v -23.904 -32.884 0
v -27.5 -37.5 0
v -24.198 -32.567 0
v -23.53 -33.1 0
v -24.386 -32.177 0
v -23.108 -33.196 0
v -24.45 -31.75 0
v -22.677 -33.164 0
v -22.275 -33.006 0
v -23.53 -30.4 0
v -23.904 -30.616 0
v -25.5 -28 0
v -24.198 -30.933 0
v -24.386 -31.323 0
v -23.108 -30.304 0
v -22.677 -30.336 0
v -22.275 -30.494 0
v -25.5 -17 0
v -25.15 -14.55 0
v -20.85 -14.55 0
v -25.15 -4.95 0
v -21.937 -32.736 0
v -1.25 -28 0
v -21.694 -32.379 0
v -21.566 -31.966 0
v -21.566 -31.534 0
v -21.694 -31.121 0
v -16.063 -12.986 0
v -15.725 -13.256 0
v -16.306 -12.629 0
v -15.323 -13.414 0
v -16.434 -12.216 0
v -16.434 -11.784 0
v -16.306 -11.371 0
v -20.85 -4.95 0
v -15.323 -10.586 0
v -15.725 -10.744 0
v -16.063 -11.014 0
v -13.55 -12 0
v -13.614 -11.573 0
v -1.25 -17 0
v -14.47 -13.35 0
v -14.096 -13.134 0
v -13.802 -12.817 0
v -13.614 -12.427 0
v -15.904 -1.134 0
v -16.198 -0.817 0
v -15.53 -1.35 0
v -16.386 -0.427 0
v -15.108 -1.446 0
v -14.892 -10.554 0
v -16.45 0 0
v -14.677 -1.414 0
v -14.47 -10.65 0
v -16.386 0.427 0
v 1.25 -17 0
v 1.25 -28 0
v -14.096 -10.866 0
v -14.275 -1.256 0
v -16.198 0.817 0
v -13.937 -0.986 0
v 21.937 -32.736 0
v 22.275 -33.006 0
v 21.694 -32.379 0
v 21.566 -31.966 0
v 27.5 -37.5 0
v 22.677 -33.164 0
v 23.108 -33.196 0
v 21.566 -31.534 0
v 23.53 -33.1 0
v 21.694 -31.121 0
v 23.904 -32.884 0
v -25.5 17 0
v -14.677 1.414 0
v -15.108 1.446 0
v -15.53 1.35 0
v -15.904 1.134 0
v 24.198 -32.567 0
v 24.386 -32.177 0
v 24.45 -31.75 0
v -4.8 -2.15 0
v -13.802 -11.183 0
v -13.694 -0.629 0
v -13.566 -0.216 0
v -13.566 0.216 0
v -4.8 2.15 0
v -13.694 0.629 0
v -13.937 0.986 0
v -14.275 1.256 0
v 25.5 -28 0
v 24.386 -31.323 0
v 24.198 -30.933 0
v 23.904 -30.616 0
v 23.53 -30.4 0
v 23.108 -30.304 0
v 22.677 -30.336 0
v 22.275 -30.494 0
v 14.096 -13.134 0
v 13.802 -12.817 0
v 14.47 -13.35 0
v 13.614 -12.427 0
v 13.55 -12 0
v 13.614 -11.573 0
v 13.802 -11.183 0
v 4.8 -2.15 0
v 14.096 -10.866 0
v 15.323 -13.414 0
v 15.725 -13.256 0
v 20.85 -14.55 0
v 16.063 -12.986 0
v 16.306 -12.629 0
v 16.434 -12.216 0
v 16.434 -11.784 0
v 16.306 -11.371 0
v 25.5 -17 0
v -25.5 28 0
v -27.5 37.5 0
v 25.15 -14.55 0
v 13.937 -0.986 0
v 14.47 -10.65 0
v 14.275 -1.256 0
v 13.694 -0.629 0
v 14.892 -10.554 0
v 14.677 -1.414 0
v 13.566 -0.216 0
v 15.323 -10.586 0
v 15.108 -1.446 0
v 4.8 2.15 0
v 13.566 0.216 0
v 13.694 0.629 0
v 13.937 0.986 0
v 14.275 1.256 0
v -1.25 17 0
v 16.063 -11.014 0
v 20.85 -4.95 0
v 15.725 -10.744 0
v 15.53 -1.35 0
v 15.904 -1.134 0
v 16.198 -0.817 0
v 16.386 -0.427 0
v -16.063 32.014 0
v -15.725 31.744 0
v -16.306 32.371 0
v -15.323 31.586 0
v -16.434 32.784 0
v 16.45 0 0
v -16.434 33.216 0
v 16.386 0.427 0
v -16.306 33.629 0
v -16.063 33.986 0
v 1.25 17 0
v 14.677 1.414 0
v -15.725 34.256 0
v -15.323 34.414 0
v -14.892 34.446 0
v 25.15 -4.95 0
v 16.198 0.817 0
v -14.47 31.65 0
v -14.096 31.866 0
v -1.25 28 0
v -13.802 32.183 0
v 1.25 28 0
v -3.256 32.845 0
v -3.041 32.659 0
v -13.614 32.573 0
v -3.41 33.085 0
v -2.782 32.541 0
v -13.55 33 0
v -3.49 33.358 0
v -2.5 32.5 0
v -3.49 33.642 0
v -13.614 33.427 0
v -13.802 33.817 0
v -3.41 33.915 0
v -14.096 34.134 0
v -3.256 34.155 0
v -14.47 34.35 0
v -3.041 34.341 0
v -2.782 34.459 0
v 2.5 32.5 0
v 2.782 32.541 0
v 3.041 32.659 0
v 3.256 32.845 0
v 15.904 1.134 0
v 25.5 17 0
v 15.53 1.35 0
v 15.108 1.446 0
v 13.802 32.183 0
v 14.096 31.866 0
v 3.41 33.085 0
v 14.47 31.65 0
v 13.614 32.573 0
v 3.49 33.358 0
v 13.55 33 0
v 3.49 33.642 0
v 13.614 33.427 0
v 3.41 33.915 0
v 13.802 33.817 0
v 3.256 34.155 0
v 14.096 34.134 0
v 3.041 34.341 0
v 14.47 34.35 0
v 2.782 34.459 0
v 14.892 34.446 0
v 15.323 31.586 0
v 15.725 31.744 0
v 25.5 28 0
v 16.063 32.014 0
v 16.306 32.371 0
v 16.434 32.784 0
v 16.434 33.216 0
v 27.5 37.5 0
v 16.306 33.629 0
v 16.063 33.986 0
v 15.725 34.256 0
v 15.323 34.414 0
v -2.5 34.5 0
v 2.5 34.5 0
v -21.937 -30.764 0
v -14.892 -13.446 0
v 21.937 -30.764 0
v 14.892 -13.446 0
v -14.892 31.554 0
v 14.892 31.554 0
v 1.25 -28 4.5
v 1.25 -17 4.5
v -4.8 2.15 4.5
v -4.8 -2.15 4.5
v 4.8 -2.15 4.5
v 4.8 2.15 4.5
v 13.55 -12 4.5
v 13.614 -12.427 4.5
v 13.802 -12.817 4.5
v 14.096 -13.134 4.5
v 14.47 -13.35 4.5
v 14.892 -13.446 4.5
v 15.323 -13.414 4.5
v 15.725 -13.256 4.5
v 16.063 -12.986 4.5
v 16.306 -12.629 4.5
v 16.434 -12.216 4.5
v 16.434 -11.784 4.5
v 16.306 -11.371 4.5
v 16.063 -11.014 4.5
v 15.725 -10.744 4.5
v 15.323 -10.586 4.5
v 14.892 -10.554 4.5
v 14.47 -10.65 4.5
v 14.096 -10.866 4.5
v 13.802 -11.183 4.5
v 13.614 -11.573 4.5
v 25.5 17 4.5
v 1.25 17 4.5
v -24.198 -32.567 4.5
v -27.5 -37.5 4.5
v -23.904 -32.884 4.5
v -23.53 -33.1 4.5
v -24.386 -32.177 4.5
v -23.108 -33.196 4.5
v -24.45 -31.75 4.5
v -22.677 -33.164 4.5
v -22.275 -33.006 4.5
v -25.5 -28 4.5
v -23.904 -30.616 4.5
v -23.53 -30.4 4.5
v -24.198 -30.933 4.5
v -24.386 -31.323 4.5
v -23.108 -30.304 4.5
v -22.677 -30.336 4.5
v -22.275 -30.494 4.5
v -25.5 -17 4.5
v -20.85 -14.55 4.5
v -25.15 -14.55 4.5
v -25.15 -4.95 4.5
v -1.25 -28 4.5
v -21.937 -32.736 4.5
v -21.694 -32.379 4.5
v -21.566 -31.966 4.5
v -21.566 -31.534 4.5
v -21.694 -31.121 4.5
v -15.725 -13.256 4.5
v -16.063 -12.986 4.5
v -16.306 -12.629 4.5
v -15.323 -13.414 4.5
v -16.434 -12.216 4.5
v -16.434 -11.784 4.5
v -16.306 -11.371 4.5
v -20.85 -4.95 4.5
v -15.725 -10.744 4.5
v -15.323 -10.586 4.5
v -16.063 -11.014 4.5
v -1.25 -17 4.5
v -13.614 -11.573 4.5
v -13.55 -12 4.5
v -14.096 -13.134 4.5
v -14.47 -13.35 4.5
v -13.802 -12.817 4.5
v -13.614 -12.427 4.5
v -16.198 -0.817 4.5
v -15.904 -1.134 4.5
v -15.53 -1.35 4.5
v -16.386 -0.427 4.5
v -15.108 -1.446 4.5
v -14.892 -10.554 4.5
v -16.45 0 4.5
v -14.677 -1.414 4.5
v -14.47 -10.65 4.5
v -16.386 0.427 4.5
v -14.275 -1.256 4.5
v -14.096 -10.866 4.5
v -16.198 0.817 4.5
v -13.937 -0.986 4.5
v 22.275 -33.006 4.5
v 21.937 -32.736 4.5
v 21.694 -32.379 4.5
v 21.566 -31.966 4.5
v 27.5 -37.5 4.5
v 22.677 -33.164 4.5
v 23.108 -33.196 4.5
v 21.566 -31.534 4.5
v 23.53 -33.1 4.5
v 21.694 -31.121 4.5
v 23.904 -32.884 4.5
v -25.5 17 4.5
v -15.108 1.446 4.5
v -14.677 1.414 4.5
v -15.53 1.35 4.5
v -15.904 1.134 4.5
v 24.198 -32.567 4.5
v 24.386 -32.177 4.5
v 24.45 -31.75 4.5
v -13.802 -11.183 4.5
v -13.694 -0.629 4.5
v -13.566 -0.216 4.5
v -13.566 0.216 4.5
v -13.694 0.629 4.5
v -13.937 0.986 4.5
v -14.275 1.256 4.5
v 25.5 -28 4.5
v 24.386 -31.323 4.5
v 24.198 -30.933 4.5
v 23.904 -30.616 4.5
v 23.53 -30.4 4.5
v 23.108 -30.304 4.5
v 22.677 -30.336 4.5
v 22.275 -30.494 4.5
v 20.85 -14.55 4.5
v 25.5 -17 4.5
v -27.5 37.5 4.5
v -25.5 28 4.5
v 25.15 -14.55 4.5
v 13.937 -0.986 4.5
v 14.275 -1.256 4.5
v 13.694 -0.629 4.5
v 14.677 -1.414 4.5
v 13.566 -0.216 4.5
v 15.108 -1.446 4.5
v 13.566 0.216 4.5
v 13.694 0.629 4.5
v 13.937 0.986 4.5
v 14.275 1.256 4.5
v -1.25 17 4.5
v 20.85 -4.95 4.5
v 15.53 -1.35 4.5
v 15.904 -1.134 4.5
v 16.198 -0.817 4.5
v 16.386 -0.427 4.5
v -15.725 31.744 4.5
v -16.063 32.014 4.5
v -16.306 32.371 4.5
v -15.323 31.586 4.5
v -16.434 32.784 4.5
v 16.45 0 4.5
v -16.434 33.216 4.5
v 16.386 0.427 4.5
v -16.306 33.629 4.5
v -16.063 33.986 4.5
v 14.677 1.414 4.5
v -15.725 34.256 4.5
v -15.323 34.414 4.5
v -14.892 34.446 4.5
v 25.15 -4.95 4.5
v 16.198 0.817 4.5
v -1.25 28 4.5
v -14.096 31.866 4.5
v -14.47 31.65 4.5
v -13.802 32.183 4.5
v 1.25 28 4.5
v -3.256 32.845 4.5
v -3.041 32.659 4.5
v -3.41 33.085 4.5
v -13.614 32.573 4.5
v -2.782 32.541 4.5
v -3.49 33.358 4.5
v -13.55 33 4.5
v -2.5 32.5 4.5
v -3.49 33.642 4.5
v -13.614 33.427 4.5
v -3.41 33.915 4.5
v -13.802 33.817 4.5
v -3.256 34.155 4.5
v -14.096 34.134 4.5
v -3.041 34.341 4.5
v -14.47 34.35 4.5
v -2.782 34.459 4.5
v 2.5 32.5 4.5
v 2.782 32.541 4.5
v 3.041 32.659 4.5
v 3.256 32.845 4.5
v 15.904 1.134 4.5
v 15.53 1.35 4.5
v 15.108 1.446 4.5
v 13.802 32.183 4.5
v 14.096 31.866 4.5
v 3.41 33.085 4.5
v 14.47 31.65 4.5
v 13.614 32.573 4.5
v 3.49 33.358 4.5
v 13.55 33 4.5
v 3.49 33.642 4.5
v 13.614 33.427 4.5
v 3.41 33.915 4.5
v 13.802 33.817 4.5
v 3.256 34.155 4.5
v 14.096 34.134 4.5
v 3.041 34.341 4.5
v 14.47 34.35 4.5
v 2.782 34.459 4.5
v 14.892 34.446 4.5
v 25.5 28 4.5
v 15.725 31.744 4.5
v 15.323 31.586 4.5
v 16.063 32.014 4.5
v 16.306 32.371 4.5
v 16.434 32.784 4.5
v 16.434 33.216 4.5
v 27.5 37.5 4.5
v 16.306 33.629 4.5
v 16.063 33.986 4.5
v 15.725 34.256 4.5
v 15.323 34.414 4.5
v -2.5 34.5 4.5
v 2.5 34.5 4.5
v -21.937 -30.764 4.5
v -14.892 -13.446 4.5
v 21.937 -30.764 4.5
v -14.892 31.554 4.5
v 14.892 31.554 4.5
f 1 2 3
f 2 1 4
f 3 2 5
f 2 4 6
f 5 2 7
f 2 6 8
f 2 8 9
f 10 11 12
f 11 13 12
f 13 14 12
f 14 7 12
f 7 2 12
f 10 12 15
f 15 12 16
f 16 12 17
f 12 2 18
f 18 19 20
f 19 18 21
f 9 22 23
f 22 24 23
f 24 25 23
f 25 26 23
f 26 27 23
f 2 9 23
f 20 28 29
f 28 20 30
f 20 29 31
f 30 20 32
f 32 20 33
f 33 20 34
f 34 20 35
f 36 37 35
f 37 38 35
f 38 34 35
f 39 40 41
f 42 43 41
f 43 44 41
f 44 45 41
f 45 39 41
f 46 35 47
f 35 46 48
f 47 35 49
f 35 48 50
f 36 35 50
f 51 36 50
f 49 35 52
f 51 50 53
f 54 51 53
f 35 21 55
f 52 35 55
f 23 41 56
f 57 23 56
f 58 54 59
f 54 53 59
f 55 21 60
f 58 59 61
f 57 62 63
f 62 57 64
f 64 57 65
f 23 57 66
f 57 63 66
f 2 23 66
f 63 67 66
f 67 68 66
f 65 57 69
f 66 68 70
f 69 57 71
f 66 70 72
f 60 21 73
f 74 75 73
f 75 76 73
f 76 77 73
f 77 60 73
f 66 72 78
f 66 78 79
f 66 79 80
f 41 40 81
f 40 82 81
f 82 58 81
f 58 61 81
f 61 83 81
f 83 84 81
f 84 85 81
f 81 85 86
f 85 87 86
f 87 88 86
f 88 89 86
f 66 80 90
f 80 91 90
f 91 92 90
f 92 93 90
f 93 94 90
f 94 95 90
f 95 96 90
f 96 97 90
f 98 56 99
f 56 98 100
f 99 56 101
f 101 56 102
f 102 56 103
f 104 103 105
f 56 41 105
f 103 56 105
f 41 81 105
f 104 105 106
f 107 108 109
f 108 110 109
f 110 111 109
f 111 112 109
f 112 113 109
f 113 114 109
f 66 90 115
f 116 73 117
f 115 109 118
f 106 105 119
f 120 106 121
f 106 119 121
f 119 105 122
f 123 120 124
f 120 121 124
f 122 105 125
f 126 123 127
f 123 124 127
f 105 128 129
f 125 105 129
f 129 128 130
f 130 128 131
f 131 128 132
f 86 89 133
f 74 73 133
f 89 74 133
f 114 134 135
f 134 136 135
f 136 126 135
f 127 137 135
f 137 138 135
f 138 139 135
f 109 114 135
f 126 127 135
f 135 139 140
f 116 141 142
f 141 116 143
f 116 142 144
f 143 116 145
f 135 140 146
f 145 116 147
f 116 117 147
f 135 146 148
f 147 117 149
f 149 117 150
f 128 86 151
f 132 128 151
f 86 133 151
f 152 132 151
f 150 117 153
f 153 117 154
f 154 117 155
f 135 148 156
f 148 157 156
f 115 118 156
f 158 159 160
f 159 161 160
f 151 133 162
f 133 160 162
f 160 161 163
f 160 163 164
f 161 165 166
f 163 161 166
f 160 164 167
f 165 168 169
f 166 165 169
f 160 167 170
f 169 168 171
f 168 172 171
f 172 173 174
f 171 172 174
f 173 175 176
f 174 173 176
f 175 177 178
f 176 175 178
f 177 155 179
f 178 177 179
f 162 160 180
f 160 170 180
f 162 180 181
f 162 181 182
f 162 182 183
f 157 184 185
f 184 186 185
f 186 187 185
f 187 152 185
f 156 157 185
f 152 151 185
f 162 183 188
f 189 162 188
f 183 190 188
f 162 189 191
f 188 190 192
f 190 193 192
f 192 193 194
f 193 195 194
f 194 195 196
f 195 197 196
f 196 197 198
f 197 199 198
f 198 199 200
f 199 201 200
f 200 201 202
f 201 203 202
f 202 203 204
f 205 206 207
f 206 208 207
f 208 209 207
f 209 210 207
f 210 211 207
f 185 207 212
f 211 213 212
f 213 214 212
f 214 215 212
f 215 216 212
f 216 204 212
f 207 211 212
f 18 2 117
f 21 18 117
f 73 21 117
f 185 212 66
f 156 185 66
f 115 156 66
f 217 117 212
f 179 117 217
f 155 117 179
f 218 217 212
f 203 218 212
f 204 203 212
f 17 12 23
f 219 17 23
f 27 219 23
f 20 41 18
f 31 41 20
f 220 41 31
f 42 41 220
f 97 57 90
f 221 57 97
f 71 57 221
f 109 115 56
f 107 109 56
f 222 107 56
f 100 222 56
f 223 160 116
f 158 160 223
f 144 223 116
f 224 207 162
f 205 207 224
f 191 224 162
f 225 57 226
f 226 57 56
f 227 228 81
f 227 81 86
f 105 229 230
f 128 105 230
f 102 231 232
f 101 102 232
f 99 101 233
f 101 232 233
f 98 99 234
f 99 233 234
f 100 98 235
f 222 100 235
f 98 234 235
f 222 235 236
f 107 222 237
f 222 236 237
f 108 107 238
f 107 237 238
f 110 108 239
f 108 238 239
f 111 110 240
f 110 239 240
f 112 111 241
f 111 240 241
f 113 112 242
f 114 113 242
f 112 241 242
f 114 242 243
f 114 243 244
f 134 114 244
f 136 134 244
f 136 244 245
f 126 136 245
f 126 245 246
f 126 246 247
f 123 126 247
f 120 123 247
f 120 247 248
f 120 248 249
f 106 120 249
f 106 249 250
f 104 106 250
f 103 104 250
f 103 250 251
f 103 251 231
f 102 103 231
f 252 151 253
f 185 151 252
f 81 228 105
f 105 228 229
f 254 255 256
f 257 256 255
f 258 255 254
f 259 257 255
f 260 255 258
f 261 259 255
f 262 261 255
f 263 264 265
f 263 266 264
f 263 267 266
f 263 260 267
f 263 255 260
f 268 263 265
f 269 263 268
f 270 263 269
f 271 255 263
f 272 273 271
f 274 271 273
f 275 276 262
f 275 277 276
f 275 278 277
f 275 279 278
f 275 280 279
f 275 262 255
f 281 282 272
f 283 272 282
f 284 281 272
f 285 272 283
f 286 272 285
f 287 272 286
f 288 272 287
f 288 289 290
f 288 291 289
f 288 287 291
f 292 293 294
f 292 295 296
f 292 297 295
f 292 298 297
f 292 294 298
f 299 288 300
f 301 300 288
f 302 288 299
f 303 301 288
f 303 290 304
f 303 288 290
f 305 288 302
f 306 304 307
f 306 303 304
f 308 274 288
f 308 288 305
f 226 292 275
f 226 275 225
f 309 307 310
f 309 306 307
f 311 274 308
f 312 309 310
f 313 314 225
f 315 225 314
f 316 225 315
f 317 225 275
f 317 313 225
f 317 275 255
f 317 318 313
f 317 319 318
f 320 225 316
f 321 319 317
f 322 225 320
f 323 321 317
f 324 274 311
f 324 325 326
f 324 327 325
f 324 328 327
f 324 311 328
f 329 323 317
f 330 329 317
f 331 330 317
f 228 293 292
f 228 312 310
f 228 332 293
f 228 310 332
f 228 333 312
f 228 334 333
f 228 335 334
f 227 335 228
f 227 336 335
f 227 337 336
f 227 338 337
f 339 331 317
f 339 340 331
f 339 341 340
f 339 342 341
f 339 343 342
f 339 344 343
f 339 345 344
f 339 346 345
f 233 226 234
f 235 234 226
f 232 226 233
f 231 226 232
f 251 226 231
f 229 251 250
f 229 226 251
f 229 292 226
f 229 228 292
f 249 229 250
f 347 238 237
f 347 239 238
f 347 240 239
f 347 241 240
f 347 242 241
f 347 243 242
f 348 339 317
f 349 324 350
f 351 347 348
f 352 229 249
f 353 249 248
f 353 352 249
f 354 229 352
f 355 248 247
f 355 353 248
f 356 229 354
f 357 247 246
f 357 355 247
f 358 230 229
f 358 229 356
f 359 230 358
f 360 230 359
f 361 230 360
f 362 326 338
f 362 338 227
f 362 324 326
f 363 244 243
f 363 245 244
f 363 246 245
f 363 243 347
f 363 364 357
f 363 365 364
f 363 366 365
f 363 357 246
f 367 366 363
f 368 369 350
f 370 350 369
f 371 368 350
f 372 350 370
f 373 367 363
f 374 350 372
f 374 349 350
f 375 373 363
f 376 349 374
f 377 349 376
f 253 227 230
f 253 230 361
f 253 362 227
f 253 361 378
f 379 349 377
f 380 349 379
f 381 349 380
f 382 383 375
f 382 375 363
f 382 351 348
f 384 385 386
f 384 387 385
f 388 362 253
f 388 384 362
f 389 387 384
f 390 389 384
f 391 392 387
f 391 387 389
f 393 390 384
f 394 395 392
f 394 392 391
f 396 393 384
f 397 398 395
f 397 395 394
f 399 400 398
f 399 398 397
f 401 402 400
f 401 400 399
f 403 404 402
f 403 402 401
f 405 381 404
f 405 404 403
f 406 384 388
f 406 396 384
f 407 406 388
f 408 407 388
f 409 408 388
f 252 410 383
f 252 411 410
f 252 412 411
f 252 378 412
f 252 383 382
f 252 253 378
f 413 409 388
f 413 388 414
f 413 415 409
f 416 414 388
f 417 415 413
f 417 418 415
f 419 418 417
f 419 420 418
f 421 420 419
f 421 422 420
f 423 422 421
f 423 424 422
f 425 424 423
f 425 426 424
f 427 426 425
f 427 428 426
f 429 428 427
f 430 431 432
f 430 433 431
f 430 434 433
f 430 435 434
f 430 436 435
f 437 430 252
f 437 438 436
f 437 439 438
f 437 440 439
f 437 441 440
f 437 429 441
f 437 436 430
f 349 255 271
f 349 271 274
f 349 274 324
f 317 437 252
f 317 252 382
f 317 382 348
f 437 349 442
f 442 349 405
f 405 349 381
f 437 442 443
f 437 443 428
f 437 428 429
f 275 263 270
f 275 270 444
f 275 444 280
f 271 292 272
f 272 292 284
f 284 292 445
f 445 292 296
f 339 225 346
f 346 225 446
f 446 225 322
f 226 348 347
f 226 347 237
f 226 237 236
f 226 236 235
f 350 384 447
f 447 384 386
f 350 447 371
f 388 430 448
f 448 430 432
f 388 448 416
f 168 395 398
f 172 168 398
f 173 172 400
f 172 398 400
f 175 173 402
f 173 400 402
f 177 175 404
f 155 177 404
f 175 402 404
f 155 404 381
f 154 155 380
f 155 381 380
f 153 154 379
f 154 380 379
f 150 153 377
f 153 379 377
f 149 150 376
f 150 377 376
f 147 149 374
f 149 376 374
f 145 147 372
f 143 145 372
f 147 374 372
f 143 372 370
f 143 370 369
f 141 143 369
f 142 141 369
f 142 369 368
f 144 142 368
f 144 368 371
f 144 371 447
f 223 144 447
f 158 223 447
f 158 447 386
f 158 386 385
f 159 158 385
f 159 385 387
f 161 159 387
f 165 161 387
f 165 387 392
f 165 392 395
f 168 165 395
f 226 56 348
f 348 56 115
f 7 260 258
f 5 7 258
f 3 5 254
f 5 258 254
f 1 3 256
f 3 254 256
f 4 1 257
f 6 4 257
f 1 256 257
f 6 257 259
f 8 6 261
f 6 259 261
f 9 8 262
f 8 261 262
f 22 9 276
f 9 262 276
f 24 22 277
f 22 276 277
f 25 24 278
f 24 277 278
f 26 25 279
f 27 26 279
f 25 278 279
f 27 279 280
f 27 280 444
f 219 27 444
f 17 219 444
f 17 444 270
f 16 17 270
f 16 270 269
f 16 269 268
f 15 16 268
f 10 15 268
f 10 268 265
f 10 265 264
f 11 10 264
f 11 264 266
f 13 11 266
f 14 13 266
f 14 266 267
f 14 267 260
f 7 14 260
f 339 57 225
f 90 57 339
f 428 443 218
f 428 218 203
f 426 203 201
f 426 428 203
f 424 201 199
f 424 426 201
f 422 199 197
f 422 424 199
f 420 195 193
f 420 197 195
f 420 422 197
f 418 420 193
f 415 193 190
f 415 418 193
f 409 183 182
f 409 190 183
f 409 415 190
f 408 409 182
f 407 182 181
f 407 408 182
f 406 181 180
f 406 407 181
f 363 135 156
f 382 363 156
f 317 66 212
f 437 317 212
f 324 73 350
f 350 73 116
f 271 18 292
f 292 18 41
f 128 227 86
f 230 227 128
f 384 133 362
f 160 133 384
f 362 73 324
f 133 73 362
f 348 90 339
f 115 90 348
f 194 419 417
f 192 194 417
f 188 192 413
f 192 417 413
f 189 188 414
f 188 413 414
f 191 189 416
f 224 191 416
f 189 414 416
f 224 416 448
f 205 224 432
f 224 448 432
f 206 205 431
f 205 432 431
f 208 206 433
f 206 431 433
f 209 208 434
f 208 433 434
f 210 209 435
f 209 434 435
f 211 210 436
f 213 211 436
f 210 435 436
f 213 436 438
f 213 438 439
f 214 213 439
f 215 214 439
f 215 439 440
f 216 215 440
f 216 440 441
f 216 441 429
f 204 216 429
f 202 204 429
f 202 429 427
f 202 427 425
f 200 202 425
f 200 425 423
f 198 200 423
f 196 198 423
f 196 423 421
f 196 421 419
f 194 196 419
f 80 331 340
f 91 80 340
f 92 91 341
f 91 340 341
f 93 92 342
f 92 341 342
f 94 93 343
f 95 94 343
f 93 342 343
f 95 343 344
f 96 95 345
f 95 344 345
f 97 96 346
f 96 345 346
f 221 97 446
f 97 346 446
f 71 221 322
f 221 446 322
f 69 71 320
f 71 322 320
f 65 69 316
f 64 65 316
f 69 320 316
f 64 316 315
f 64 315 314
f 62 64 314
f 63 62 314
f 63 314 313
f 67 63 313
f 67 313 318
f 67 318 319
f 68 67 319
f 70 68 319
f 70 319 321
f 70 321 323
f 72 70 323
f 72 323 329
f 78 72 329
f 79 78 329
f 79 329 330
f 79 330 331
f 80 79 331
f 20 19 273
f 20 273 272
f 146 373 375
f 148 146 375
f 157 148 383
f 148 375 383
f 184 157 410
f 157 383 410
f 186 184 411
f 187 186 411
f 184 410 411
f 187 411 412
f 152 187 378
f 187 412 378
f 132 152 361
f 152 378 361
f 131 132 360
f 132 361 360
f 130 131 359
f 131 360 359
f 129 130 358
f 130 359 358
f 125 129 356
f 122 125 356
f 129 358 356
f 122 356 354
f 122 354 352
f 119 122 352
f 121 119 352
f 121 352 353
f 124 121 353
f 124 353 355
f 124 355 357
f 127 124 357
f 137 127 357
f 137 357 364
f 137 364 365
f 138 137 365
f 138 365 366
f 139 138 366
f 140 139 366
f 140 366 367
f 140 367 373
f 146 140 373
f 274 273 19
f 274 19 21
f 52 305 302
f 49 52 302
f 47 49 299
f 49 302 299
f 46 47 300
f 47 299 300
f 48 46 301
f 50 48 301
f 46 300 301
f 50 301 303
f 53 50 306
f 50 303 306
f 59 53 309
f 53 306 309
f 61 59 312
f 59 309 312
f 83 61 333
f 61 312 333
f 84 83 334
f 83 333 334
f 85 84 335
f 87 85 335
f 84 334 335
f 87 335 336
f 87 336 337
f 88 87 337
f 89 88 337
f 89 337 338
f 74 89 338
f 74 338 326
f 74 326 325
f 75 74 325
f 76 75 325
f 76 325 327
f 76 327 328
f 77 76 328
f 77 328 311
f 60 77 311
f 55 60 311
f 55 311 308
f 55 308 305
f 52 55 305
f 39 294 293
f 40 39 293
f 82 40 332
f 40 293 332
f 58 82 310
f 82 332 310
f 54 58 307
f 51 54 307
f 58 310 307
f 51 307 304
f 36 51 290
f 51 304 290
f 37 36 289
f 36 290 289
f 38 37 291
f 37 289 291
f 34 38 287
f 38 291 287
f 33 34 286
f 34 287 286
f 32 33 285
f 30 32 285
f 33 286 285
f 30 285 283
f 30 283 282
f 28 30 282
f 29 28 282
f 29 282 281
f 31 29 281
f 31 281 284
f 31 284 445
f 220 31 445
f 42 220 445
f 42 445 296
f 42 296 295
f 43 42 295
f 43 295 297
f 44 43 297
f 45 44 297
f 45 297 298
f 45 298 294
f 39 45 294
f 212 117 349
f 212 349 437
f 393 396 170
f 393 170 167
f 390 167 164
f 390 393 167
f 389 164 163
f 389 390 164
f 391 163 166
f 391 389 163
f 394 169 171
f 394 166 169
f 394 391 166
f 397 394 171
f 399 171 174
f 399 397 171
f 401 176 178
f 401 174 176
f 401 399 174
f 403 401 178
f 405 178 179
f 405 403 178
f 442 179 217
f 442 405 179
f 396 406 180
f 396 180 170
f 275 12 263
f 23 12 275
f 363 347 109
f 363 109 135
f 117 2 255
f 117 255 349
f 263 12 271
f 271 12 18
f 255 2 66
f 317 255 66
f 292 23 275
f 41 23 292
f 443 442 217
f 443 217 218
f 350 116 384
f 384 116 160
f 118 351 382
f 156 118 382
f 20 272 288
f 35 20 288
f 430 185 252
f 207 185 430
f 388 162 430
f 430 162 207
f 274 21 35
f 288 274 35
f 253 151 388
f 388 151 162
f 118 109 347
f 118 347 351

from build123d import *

# Parameters (mm, degrees)
SKETCH1_W                 = 55
SKETCH1_H                 = 75
SKETCH1_W_2               = 24.25
SKETCH1_H_2               = 11
BOSS_EXTRUDE1_DEPTH       = 4.5
SKETCH2_R                 = 1.45
SCREWHOLES_DEPTH          = 47.719910103
SKETCH4_W                 = 9.6
SKETCH4_H                 = 4.3
MOUNTINGPLATETAB_DEPTH    = 47.719910103
SKETCH5_R                 = 1.45
SKETCH5_W                 = 4.3
SKETCH5_H                 = 9.6
BRACETABS_DEPTH           = 47.719910103
SKETCH8_R                 = 1.45
EXPANSIONSCREWHOLES_DEPTH = 47.719910103
CABLETIESLOT_DEPTH        = 47.719910103


with BuildPart() as part:
    # Sketch1 → Boss-Extrude1 (new body)
    with BuildSketch(Plane.XY):
        Rectangle(SKETCH1_W, SKETCH1_H)
        with Locations((-13.375, 22.5)):
            Rectangle(SKETCH1_W_2, SKETCH1_H_2, mode=Mode.SUBTRACT)
        with Locations((13.375, 22.5)):
            Rectangle(SKETCH1_W_2, SKETCH1_H_2, mode=Mode.SUBTRACT)
        with Locations((13.375, -22.5)):
            Rectangle(SKETCH1_W_2, SKETCH1_H_2, mode=Mode.SUBTRACT)
        with Locations((-13.375, -22.5)):
            Rectangle(SKETCH1_W_2, SKETCH1_H_2, mode=Mode.SUBTRACT)
    extrude(amount=BOSS_EXTRUDE1_DEPTH)

    # Sketch2 → screwHoles (cut, through all)
    with BuildSketch(Plane.XY.offset(4.5)):
        with Locations((-15, 33)):
            Circle(SKETCH2_R)
        with Locations(Location((15, 33, 0), (0, 0, 180))):
            Circle(SKETCH2_R)
        with Locations((15, 0)):
            Circle(SKETCH2_R)
        with Locations(Location((-15, 0, 0), (0, 0, 180))):
            Circle(SKETCH2_R)
    extrude(amount=-SCREWHOLES_DEPTH, mode=Mode.SUBTRACT)

    # Sketch4 → mountingPlateTab (cut, through all)
    with BuildSketch(Plane.XY.offset(4.5)):
        Rectangle(SKETCH4_W, SKETCH4_H)
    extrude(amount=-MOUNTINGPLATETAB_DEPTH, mode=Mode.SUBTRACT)

    # Sketch5 → BraceTabs (cut, through all)
    with BuildSketch(Plane.XY.offset(4.5)):
        with Locations((23, -31.75)):
            Circle(SKETCH5_R)
        with Locations(Location((-23, -31.75, 0), (0, 0, 180))):
            Circle(SKETCH5_R)
        with Locations((23, -9.75)):
            Rectangle(SKETCH5_W, SKETCH5_H)
        with Locations((-23, -9.75)):
            Rectangle(SKETCH5_W, SKETCH5_H)
    extrude(amount=-BRACETABS_DEPTH, mode=Mode.SUBTRACT)

    # Sketch8 → ExpansionScrewholes (cut, through all)
    with BuildSketch(Plane.XY.offset(4.5)):
        with Locations((-15, -12)):
            Circle(SKETCH8_R)
        with Locations(Location((15, -12, 0), (0, 0, 180))):
            Circle(SKETCH8_R)
    extrude(amount=-EXPANSIONSCREWHOLES_DEPTH, mode=Mode.SUBTRACT)

    # Sketch12 → CableTieSlot (cut, through all)
    with BuildSketch(Plane.XY.offset(4.5)):
        with BuildLine():
            Line((-2.5, 34.5), (2.5, 34.5))
            ThreePointArc((2.5, 34.5), (3.5, 33.5), (2.5, 32.5))
            Line((2.5, 32.5), (-2.5, 32.5))
            ThreePointArc((-2.5, 32.5), (-3.5, 33.5), (-2.5, 34.5))
        make_face()
    extrude(amount=-CABLETIESLOT_DEPTH, mode=Mode.SUBTRACT)


solid = part.part
